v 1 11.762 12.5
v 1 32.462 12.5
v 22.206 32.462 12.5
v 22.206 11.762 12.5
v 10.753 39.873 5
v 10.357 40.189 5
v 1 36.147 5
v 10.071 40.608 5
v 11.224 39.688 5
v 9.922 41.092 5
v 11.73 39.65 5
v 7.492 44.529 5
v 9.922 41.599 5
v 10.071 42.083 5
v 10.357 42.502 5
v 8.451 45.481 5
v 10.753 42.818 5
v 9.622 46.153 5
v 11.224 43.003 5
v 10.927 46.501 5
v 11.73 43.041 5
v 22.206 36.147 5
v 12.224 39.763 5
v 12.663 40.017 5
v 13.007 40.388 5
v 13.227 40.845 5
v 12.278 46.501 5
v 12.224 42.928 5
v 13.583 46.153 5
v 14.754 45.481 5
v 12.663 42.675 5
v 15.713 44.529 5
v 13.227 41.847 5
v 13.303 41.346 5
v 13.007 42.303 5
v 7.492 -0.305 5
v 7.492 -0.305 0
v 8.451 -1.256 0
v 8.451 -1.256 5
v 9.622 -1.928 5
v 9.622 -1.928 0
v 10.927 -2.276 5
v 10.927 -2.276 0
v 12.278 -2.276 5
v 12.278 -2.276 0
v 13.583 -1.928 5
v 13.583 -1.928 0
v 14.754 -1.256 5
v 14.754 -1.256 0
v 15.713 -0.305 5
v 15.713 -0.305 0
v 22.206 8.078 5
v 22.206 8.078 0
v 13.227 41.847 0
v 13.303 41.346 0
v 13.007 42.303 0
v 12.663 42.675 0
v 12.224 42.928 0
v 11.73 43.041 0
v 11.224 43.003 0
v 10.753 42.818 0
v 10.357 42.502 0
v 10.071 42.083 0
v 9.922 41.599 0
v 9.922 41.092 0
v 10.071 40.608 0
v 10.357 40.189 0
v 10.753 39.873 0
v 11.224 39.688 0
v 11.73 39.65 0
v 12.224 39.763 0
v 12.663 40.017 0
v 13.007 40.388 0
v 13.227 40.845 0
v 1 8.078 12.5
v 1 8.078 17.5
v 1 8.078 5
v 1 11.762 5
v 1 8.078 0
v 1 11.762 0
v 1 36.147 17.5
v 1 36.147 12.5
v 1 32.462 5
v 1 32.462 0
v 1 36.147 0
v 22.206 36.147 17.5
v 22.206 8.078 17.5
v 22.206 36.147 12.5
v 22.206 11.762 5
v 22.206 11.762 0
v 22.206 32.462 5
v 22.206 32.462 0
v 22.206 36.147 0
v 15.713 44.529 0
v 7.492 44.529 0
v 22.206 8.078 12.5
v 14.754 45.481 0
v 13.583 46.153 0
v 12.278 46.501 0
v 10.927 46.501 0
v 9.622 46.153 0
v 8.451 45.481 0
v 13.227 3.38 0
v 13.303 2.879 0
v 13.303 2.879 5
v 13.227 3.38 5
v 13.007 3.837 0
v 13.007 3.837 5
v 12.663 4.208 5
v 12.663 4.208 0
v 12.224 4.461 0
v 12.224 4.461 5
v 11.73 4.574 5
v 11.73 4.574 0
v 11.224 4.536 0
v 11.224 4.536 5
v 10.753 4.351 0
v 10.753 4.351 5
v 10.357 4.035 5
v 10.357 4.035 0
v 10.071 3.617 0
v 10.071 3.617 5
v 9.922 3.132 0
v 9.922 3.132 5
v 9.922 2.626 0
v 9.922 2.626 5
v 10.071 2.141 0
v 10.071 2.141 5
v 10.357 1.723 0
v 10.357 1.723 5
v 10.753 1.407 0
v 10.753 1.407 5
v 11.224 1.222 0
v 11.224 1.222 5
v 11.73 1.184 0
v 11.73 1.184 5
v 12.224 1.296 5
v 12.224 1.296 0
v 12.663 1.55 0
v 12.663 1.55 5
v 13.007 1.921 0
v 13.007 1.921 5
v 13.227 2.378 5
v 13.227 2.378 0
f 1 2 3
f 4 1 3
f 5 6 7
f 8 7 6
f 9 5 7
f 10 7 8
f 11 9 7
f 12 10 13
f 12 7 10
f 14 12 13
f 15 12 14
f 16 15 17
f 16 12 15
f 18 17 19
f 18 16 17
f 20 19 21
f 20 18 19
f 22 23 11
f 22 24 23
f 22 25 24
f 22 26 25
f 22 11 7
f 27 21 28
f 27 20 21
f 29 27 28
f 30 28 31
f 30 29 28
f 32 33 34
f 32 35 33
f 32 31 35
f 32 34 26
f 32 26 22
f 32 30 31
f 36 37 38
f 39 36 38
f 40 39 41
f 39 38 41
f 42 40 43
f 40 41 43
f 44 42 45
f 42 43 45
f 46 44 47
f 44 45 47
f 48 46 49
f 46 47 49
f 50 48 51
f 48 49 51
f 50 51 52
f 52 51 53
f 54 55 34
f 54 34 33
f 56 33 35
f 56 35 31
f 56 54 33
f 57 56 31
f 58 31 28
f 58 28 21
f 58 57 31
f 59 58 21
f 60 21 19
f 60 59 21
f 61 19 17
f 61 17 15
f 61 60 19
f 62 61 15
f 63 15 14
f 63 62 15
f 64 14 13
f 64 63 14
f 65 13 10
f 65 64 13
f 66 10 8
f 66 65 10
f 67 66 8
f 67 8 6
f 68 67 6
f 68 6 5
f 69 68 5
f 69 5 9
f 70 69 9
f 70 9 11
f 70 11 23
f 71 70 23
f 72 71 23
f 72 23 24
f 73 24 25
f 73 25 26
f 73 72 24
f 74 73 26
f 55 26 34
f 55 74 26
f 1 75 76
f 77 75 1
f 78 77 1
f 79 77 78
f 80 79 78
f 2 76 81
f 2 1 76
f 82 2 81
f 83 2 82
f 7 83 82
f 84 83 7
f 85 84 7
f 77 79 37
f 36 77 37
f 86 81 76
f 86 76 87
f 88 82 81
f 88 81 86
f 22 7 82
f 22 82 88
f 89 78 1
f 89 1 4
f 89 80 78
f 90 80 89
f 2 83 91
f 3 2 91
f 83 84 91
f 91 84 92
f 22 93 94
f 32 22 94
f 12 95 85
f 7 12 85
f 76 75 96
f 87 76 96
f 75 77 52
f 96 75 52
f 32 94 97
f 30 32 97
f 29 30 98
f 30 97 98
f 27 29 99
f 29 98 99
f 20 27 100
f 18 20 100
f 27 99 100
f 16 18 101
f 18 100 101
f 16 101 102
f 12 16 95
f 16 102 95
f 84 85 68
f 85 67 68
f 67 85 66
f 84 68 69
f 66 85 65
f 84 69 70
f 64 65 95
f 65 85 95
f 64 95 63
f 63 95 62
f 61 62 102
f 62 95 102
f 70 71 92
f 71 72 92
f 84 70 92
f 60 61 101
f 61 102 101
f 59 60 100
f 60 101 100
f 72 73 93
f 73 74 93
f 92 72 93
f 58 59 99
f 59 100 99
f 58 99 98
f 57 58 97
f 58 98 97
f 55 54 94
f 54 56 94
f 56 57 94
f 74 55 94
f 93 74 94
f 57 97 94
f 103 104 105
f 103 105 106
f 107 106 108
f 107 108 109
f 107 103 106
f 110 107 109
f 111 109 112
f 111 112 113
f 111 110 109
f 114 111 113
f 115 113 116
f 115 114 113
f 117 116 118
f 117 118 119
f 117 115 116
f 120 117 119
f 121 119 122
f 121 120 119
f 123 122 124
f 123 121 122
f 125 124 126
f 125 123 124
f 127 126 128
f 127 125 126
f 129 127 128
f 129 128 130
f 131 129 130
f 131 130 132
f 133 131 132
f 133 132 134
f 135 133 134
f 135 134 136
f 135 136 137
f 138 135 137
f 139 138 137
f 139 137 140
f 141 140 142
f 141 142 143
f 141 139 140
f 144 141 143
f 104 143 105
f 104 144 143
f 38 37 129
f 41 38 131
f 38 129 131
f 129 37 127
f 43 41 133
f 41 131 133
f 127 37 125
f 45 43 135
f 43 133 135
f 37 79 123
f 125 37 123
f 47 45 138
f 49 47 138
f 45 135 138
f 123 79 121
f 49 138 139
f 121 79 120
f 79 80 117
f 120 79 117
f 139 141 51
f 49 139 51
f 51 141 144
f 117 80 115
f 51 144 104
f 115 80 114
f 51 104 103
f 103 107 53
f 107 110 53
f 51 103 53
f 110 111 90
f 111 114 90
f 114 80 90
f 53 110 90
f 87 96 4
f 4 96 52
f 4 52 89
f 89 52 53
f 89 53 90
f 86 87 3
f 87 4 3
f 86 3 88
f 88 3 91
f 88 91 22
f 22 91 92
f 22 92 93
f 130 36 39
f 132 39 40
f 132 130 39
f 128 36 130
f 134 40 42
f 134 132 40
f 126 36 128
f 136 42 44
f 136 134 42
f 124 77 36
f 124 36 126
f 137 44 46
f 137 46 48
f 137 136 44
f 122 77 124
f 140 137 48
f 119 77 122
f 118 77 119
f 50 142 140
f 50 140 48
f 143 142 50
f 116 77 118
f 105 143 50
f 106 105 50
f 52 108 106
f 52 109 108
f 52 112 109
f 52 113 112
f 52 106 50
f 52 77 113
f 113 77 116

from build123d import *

# Parameters (mm, degrees)
SKETCH5_R             = 1.7
BOSS_EXTRUDE5_DEPTH   = 5
BOSS_EXTRUDE5_2_DEPTH = 5
SKETCH6_W             = 21.205551353
SKETCH6_H             = 3.684327219
BOSS_EXTRUDE6_DEPTH   = 7.5
SKETCH7_W             = 21.205551353
SKETCH7_H             = 28.068654438
BOSS_EXTRUDE7_DEPTH   = 5


with BuildPart() as part:
    # Sketch5 → Boss-Extrude5 (new body)
    with BuildSketch(Plane.XY):
        with BuildLine():
            Line((7.492385077, 44.529251739), (1, 36.146663352))
            Line((1, 36.146663352), (1, 32.462336133))
            Line((1, 32.462336133), (5.2, 32.462336133))
            Line((5.2, 32.462336133), (22.205551353, 32.462336133))
            Line((22.205551353, 32.462336133), (22.205551353, 36.146663352))
            Line((22.205551353, 36.146663352), (15.713166275, 44.529251739))
            ThreePointArc((15.713166275, 44.529251739), (11.602775676, 46.544776073), (7.492385077, 44.529251739))
        make_face()
        with Locations((11.602775676, 41.345719713)):
            Circle(SKETCH5_R, mode=Mode.SUBTRACT)
    extrude(amount=BOSS_EXTRUDE5_DEPTH)



with BuildPart() as body_2:
    # Sketch5 → Boss-Extrude5 2 (new body)
    with BuildSketch(Plane.XY):
        with BuildLine():
            Line((5.2, 11.762336133), (1, 11.762336133))
            Line((1, 11.762336133), (1, 8.078008914))
            Line((1, 8.078008914), (7.492385077, -0.304579472))
            ThreePointArc((7.492385077, -0.304579472), (11.602775676, -2.320103807), (15.713166275, -0.304579472))
            Line((15.713166275, -0.304579472), (22.205551353, 8.078008914))
            Line((22.205551353, 8.078008914), (22.205551353, 11.762336133))
            Line((22.205551353, 11.762336133), (5.2, 11.762336133))
        make_face()
        with Locations((11.602775676, 2.878952554)):
            Circle(SKETCH5_R, mode=Mode.SUBTRACT)
    extrude(amount=BOSS_EXTRUDE5_2_DEPTH)


with BuildPart() as part_1:
    add(part.part)

    add(body_2.part)  # Boss-Extrude6 merges body 2
    # Sketch6 → Boss-Extrude6 (add)
    with BuildSketch(Plane.XY.offset(5)):
        with Locations((11.602775677, 9.920172523)):
            Rectangle(SKETCH6_W, SKETCH6_H)
        with Locations((11.602775677, 34.304499742)):
            Rectangle(SKETCH6_W, SKETCH6_H)
    extrude(amount=BOSS_EXTRUDE6_DEPTH)

    # Sketch7 → Boss-Extrude7 (add)
    with BuildSketch(Plane.XY.offset(12.5)):
        with Locations((11.602775677, 22.112336133)):
            Rectangle(SKETCH7_W, SKETCH7_H)
    extrude(amount=BOSS_EXTRUDE7_DEPTH)


solid = part_1.part
